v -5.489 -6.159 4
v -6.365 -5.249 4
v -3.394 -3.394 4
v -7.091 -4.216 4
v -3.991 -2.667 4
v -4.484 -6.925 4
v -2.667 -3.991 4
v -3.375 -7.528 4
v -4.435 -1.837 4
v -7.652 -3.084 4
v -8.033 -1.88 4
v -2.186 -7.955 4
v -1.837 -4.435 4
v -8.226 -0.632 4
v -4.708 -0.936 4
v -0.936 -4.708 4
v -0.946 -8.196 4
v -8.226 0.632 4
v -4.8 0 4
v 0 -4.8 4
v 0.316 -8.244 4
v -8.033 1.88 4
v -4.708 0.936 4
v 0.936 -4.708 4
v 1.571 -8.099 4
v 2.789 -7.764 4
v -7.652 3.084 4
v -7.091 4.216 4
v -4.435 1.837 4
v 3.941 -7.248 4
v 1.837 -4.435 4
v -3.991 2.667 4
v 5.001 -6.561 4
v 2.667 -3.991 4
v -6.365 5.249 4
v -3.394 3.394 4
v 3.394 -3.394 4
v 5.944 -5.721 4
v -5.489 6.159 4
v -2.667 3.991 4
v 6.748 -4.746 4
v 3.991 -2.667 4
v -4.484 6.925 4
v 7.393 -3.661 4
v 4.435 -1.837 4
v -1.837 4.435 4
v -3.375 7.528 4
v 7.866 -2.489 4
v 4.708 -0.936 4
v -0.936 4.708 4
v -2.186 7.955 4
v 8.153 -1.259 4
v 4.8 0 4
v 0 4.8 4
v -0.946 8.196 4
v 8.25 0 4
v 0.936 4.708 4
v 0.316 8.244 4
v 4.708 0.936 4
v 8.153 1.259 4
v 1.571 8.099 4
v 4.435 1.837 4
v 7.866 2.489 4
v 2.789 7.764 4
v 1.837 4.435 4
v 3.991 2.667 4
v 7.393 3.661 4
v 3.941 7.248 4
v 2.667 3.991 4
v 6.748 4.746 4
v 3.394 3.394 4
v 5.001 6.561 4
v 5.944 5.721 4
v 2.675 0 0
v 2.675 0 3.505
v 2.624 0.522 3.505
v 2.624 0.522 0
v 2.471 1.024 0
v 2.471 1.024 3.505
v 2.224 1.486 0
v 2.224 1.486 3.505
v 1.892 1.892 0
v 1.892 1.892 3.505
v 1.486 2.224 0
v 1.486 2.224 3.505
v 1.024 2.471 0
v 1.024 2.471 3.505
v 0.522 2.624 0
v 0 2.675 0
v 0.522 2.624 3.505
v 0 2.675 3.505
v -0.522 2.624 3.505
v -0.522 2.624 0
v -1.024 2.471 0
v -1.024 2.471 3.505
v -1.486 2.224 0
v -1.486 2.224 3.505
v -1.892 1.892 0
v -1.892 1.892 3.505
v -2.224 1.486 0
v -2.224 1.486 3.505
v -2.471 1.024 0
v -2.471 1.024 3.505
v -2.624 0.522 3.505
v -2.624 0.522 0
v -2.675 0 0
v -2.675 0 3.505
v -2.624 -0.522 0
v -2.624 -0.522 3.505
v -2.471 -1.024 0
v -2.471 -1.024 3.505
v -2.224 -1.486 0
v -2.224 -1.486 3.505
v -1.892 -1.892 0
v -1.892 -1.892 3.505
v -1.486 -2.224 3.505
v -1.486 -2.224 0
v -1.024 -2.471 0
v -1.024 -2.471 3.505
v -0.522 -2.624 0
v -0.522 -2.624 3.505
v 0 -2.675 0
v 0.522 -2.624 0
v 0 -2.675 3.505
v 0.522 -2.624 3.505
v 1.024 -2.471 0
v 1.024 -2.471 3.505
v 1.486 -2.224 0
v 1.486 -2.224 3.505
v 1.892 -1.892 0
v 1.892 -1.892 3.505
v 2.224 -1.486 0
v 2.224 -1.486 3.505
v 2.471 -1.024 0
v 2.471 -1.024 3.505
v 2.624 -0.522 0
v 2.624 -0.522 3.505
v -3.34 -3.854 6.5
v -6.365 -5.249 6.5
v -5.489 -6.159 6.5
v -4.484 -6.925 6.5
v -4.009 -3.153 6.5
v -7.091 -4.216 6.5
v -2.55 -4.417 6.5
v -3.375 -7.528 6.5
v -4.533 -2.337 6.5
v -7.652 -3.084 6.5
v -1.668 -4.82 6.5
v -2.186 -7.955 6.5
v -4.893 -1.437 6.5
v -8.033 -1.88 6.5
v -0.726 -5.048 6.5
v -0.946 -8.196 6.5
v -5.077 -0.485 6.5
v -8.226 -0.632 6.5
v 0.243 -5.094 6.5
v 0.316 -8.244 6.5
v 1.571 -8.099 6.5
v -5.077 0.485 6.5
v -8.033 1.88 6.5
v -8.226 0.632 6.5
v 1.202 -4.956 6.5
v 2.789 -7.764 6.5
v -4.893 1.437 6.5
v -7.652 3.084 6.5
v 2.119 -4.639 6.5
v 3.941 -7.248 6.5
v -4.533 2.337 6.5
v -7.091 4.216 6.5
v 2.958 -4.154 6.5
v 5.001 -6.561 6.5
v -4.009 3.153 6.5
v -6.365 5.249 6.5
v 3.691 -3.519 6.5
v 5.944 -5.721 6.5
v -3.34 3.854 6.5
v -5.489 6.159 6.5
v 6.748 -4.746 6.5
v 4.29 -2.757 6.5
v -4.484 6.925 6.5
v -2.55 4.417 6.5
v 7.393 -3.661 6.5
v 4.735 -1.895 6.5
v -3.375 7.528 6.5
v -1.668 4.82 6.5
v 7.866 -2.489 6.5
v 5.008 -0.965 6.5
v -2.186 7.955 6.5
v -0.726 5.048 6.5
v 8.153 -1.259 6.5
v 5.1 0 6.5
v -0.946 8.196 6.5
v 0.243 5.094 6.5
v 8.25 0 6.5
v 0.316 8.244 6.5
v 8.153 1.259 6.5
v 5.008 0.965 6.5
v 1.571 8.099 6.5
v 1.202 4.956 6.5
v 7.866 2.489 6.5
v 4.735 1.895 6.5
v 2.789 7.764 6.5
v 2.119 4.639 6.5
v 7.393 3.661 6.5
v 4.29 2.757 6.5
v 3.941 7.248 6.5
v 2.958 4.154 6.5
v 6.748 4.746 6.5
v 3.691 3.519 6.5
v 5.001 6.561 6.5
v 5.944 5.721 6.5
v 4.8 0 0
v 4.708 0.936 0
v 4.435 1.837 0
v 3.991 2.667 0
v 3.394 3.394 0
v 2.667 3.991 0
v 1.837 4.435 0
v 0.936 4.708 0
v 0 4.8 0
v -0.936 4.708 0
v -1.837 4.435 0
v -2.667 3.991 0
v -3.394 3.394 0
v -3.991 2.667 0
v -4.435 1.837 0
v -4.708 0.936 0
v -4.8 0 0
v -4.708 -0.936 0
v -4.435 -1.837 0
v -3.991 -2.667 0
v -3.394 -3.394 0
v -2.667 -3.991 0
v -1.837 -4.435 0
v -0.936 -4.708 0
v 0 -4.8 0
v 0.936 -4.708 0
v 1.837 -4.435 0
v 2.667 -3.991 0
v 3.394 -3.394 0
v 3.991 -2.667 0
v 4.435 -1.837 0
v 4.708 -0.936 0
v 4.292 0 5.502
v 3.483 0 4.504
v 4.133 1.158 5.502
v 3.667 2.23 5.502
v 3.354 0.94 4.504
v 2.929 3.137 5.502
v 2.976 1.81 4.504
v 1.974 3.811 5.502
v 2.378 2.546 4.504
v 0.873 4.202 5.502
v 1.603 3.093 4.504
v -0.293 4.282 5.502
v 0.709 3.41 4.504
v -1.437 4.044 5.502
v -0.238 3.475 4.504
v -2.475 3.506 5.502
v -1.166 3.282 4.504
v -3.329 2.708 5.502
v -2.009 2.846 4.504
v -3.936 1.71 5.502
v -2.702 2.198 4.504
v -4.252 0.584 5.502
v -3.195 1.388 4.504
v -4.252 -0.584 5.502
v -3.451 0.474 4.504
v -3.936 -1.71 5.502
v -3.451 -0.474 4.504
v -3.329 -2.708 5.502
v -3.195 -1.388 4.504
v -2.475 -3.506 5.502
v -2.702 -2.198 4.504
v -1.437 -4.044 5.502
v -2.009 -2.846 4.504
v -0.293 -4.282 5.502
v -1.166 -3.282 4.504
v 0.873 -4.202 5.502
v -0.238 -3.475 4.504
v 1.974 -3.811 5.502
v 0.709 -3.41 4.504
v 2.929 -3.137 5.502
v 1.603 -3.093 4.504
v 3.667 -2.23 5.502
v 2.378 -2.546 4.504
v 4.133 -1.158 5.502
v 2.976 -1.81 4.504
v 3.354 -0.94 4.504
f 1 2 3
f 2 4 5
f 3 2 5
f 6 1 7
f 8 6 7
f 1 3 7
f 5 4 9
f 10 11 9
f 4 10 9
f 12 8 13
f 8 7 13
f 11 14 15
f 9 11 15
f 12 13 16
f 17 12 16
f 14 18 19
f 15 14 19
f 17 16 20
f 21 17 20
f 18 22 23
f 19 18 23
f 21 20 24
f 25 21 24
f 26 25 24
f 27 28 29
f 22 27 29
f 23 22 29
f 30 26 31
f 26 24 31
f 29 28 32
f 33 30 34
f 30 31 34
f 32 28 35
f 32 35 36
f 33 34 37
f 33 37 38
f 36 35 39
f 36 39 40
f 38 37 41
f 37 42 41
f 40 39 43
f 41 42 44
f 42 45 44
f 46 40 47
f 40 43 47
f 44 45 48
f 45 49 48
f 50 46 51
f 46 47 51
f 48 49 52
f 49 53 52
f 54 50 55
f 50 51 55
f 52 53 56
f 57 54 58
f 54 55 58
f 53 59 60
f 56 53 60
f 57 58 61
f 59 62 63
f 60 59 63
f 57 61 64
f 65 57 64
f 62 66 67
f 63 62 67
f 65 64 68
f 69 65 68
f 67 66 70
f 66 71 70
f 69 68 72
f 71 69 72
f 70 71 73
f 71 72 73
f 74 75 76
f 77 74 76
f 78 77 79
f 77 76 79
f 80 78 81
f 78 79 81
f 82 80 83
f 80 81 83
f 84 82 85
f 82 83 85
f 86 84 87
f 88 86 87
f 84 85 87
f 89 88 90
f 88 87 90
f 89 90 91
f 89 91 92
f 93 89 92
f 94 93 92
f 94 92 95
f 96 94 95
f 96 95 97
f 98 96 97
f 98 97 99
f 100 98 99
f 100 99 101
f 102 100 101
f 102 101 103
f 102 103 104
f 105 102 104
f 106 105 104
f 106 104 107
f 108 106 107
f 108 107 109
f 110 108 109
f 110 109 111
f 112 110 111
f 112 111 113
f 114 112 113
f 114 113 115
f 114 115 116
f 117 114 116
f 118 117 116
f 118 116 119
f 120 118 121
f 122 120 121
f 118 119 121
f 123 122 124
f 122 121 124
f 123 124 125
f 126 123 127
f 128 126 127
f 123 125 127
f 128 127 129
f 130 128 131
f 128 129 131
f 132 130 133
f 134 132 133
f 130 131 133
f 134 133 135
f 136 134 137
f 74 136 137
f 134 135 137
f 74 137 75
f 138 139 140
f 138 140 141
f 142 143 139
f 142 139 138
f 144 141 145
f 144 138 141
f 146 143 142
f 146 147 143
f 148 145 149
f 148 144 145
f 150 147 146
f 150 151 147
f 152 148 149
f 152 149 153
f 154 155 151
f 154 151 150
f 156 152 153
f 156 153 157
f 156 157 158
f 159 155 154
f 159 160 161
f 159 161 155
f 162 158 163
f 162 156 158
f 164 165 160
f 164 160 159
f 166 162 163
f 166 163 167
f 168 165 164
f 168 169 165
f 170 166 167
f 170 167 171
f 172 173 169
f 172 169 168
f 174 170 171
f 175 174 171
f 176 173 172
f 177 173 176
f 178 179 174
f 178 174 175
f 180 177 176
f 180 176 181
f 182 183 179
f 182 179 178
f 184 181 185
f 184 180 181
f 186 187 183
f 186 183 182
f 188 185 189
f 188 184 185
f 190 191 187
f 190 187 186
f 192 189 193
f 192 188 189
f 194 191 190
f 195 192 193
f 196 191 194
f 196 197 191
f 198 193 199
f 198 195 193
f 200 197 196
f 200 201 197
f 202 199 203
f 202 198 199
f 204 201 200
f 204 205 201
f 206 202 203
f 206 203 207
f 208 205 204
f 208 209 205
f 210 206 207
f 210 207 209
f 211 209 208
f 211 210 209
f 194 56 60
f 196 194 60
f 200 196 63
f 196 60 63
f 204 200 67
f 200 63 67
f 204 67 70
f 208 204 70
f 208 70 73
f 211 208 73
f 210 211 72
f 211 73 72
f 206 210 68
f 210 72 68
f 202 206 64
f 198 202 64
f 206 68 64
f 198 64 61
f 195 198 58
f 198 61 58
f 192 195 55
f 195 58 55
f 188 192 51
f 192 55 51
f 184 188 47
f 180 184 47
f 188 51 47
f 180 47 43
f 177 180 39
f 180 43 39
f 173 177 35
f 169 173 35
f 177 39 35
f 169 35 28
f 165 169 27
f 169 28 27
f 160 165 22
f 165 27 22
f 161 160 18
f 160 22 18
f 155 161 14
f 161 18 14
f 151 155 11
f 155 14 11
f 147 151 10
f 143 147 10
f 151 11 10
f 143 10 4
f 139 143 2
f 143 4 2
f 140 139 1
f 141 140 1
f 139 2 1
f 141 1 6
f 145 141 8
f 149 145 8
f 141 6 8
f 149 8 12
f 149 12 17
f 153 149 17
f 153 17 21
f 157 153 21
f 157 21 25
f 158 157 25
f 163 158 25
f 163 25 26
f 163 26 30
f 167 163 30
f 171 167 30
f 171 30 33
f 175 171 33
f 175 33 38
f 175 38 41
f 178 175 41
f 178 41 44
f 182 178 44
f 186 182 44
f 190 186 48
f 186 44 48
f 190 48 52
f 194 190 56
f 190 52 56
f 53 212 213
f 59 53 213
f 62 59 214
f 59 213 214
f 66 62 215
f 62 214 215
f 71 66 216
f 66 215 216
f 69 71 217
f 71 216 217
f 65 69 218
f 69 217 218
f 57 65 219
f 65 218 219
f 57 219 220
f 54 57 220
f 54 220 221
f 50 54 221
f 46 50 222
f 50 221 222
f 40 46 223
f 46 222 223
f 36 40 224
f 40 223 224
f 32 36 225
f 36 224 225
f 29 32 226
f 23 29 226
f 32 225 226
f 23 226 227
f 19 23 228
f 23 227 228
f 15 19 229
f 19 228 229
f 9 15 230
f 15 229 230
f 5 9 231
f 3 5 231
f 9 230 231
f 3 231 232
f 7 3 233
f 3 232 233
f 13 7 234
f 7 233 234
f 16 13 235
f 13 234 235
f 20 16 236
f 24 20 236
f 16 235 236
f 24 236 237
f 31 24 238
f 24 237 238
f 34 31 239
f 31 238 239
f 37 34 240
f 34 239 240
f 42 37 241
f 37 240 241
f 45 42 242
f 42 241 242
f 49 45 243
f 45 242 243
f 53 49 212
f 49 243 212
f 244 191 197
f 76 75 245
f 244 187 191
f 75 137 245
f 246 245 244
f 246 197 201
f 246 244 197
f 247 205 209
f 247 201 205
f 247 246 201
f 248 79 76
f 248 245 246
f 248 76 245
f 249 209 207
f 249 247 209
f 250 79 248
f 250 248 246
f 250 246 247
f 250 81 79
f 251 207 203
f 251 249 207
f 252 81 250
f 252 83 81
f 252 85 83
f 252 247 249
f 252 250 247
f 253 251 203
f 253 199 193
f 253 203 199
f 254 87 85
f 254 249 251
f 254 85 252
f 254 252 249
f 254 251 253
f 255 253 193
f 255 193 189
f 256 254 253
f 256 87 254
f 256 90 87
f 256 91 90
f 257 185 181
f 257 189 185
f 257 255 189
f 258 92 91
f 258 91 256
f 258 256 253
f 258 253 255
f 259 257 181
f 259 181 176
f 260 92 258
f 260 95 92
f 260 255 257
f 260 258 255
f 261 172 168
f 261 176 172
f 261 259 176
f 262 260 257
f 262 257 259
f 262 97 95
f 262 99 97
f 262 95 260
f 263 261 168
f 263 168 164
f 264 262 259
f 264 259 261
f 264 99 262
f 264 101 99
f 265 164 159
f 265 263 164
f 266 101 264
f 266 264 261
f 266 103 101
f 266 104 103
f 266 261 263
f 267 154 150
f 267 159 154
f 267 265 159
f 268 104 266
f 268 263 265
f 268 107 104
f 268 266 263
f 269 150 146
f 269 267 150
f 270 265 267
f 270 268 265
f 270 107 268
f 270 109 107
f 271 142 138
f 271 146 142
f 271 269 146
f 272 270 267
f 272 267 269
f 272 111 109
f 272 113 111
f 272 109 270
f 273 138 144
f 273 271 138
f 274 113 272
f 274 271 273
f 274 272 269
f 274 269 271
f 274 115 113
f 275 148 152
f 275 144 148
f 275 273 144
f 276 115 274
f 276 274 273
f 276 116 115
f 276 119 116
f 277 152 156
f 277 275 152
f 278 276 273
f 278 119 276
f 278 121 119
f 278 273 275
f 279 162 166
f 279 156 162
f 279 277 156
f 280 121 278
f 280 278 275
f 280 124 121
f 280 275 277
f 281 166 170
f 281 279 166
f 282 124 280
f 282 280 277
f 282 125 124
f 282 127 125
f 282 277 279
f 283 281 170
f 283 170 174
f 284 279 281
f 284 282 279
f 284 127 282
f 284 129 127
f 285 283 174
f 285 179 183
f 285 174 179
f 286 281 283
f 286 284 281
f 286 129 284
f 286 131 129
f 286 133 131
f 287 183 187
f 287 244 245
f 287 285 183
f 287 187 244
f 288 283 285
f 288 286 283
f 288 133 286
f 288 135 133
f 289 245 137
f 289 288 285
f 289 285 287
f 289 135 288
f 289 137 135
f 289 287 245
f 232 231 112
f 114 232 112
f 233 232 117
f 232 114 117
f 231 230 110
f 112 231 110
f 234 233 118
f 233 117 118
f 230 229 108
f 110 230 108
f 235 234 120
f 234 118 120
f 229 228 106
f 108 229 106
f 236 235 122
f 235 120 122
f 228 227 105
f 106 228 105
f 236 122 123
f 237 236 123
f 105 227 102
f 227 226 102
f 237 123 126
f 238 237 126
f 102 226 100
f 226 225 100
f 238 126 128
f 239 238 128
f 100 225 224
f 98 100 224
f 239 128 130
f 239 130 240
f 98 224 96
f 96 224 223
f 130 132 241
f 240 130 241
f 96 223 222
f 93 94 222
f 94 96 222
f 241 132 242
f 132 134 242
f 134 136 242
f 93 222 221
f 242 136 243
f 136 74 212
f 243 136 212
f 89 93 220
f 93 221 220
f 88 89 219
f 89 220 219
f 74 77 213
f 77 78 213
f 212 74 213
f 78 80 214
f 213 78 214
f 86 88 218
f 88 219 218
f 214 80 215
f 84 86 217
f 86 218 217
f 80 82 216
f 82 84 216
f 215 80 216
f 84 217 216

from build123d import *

# Parameters (mm, degrees)
SKETCH1_R           = 4.8
BOSS_EXTRUDE1_DEPTH = 4
SKETCH2_R           = 8.25
BOSS_EXTRUDE2_DEPTH = 2.5
SKETCH3_R           = 2.675
CUT_EXTRUDE1_DEPTH  = 6.5
SKETCH4_R           = 5.1
CUT_EXTRUDE2_DEPTH  = 3
CUT_EXTRUDE2_TAPER  = 39


with BuildPart() as part:
    # Sketch1 → Boss-Extrude1 (new body)
    with BuildSketch(Plane.XY):
        Circle(SKETCH1_R)
    extrude(amount=BOSS_EXTRUDE1_DEPTH)

    # Sketch2 → Boss-Extrude2 (add)
    with BuildSketch(Plane.XY.offset(4)):
        Circle(SKETCH2_R)
    extrude(amount=BOSS_EXTRUDE2_DEPTH)

    # Sketch3 → Cut-Extrude1 (cut)
    with BuildSketch(Plane.XY.offset(6.5)):
        Circle(SKETCH3_R)
    extrude(amount=-CUT_EXTRUDE1_DEPTH, mode=Mode.SUBTRACT)

    # Sketch4 → Cut-Extrude2 (cut)
    with BuildSketch(Plane.XY.offset(6.5)):
        Circle(SKETCH4_R)
    extrude(amount=-CUT_EXTRUDE2_DEPTH, taper=CUT_EXTRUDE2_TAPER, mode=Mode.SUBTRACT)


solid = part.part
